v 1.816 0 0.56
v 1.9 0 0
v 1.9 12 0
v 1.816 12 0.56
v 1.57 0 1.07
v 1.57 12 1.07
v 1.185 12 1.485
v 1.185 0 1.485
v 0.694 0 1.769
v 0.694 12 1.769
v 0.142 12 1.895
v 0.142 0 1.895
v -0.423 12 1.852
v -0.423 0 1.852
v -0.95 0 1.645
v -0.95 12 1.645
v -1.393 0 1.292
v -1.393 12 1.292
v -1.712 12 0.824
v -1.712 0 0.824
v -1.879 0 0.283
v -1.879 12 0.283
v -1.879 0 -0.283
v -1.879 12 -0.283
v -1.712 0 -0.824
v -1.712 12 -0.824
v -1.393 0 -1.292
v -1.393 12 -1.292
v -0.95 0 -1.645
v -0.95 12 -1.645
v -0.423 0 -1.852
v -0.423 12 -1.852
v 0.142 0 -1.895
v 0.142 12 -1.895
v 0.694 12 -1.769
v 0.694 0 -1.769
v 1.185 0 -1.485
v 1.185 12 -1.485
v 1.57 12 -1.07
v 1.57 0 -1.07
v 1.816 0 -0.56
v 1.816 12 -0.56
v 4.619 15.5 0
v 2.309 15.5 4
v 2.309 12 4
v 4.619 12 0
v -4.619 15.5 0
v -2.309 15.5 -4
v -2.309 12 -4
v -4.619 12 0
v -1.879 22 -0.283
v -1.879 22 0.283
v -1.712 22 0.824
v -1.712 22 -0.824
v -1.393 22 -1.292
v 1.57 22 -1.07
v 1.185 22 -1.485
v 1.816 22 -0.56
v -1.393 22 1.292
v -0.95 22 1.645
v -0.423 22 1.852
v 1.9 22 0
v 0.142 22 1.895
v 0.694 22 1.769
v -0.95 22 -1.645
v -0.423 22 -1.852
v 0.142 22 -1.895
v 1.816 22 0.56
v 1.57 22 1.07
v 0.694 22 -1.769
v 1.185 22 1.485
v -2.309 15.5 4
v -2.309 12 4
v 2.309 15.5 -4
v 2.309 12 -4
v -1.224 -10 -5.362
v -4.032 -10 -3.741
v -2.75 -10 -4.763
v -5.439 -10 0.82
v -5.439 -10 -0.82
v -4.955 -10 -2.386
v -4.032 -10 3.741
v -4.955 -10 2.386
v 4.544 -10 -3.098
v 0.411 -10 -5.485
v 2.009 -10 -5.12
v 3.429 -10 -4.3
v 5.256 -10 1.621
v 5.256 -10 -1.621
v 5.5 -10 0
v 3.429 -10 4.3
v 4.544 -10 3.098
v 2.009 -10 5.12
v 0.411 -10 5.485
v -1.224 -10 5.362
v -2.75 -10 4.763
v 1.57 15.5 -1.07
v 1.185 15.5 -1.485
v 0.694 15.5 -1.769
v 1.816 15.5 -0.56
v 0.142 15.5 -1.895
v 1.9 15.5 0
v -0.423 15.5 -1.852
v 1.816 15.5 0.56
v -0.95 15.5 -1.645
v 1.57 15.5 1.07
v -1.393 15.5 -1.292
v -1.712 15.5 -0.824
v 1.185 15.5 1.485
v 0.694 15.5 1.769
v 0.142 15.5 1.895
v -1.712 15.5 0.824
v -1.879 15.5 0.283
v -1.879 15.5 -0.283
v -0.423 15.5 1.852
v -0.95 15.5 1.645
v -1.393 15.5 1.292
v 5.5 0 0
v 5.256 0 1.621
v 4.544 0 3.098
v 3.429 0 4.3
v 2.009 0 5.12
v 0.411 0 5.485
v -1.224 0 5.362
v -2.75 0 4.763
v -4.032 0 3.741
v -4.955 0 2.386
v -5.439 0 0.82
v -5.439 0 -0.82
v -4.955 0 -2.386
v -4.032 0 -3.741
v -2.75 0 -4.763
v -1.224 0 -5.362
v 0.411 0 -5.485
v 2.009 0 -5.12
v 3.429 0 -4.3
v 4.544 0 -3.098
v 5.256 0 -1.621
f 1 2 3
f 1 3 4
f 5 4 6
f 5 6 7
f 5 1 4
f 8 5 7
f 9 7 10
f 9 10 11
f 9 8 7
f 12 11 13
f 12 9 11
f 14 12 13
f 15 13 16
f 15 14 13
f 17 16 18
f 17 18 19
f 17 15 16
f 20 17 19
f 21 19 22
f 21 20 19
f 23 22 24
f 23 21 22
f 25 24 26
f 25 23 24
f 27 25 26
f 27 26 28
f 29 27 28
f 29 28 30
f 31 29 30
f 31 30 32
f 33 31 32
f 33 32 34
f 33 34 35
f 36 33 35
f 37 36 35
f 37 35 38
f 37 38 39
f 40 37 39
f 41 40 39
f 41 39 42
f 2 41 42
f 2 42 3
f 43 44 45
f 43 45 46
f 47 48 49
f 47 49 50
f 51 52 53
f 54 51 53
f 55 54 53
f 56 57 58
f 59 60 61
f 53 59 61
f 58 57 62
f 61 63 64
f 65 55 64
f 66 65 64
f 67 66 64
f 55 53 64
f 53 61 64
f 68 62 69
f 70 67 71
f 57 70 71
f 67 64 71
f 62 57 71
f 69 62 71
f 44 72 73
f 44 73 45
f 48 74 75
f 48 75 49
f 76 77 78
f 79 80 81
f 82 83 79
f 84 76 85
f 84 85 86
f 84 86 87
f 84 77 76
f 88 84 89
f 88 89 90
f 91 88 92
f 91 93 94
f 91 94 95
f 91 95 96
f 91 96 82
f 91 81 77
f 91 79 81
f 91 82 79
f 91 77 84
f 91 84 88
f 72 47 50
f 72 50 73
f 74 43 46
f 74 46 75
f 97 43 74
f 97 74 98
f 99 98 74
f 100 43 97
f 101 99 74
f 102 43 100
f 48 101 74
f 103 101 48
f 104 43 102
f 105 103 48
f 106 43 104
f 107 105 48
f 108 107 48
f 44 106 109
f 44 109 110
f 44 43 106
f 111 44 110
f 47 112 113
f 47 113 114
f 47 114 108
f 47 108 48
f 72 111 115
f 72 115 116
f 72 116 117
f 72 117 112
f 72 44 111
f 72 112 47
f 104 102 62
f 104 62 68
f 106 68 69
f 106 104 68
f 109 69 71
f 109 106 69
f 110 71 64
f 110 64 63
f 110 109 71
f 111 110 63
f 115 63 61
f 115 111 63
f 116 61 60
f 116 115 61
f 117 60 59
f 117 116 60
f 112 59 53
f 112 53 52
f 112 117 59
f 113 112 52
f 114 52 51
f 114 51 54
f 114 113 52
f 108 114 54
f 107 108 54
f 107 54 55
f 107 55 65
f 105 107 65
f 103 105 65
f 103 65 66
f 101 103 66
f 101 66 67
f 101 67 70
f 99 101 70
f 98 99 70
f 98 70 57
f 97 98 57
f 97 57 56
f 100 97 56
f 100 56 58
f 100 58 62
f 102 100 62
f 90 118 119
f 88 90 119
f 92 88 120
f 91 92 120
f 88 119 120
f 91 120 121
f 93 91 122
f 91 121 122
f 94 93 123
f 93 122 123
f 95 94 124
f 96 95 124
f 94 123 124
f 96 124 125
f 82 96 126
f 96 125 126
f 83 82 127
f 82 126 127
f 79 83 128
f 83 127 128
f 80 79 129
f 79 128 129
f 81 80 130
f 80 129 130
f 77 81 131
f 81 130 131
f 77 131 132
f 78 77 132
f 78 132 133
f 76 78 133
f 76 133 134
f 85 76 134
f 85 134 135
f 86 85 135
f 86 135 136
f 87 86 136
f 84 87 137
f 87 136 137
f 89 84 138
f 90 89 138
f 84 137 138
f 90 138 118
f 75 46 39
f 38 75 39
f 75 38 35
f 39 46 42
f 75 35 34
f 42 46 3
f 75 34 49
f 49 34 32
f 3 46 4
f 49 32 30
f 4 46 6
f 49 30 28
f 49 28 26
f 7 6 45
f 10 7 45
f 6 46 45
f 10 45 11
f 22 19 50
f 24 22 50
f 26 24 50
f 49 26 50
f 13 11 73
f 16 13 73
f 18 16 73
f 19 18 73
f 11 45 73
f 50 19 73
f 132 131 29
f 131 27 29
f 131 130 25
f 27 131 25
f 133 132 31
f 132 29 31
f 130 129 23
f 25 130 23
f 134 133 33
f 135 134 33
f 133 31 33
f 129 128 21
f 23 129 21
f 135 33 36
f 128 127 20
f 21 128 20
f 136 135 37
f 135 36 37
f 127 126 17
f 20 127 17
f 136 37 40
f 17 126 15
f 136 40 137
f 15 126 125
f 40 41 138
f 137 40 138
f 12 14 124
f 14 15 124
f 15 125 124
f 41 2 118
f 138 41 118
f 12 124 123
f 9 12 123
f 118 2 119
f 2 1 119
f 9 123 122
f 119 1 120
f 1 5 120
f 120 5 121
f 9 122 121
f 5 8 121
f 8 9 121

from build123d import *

# Parameters (mm, degrees)
F0_R     = 5.5
F0_R_2   = 1.9
F1_DEPTH = 10
F2_DEPTH = 22
F4_START = -6.5
F4_DEPTH = 3.5


with BuildPart() as f1:
    # F0 (on Front) → F1 (new body)
    with BuildSketch(Plane.XZ):
        Circle(F0_R)
        Circle(F0_R_2, mode=Mode.SUBTRACT)
        Circle(F0_R_2)
    extrude(amount=F1_DEPTH)

    # F0 (on Front) → F2 (join)
    with BuildSketch(Plane.XZ):
        Circle(F0_R_2)
    extrude(amount=-F2_DEPTH)

    # F3 (on face) → F4 (join)
    with BuildSketch(Plane(origin=(0, 22, 0), x_dir=(-1, 0, 0), z_dir=(0, 1, 0)).offset(F4_START)):
        Polygon((2.3094010768, 4), (-2.3094010768, 4), (-4.6188021535, 0), (-2.3094010768, -4), (2.3094010768, -4), (4.6188021535, 0), align=None)
    extrude(amount=-F4_DEPTH)


solid = f1.part
